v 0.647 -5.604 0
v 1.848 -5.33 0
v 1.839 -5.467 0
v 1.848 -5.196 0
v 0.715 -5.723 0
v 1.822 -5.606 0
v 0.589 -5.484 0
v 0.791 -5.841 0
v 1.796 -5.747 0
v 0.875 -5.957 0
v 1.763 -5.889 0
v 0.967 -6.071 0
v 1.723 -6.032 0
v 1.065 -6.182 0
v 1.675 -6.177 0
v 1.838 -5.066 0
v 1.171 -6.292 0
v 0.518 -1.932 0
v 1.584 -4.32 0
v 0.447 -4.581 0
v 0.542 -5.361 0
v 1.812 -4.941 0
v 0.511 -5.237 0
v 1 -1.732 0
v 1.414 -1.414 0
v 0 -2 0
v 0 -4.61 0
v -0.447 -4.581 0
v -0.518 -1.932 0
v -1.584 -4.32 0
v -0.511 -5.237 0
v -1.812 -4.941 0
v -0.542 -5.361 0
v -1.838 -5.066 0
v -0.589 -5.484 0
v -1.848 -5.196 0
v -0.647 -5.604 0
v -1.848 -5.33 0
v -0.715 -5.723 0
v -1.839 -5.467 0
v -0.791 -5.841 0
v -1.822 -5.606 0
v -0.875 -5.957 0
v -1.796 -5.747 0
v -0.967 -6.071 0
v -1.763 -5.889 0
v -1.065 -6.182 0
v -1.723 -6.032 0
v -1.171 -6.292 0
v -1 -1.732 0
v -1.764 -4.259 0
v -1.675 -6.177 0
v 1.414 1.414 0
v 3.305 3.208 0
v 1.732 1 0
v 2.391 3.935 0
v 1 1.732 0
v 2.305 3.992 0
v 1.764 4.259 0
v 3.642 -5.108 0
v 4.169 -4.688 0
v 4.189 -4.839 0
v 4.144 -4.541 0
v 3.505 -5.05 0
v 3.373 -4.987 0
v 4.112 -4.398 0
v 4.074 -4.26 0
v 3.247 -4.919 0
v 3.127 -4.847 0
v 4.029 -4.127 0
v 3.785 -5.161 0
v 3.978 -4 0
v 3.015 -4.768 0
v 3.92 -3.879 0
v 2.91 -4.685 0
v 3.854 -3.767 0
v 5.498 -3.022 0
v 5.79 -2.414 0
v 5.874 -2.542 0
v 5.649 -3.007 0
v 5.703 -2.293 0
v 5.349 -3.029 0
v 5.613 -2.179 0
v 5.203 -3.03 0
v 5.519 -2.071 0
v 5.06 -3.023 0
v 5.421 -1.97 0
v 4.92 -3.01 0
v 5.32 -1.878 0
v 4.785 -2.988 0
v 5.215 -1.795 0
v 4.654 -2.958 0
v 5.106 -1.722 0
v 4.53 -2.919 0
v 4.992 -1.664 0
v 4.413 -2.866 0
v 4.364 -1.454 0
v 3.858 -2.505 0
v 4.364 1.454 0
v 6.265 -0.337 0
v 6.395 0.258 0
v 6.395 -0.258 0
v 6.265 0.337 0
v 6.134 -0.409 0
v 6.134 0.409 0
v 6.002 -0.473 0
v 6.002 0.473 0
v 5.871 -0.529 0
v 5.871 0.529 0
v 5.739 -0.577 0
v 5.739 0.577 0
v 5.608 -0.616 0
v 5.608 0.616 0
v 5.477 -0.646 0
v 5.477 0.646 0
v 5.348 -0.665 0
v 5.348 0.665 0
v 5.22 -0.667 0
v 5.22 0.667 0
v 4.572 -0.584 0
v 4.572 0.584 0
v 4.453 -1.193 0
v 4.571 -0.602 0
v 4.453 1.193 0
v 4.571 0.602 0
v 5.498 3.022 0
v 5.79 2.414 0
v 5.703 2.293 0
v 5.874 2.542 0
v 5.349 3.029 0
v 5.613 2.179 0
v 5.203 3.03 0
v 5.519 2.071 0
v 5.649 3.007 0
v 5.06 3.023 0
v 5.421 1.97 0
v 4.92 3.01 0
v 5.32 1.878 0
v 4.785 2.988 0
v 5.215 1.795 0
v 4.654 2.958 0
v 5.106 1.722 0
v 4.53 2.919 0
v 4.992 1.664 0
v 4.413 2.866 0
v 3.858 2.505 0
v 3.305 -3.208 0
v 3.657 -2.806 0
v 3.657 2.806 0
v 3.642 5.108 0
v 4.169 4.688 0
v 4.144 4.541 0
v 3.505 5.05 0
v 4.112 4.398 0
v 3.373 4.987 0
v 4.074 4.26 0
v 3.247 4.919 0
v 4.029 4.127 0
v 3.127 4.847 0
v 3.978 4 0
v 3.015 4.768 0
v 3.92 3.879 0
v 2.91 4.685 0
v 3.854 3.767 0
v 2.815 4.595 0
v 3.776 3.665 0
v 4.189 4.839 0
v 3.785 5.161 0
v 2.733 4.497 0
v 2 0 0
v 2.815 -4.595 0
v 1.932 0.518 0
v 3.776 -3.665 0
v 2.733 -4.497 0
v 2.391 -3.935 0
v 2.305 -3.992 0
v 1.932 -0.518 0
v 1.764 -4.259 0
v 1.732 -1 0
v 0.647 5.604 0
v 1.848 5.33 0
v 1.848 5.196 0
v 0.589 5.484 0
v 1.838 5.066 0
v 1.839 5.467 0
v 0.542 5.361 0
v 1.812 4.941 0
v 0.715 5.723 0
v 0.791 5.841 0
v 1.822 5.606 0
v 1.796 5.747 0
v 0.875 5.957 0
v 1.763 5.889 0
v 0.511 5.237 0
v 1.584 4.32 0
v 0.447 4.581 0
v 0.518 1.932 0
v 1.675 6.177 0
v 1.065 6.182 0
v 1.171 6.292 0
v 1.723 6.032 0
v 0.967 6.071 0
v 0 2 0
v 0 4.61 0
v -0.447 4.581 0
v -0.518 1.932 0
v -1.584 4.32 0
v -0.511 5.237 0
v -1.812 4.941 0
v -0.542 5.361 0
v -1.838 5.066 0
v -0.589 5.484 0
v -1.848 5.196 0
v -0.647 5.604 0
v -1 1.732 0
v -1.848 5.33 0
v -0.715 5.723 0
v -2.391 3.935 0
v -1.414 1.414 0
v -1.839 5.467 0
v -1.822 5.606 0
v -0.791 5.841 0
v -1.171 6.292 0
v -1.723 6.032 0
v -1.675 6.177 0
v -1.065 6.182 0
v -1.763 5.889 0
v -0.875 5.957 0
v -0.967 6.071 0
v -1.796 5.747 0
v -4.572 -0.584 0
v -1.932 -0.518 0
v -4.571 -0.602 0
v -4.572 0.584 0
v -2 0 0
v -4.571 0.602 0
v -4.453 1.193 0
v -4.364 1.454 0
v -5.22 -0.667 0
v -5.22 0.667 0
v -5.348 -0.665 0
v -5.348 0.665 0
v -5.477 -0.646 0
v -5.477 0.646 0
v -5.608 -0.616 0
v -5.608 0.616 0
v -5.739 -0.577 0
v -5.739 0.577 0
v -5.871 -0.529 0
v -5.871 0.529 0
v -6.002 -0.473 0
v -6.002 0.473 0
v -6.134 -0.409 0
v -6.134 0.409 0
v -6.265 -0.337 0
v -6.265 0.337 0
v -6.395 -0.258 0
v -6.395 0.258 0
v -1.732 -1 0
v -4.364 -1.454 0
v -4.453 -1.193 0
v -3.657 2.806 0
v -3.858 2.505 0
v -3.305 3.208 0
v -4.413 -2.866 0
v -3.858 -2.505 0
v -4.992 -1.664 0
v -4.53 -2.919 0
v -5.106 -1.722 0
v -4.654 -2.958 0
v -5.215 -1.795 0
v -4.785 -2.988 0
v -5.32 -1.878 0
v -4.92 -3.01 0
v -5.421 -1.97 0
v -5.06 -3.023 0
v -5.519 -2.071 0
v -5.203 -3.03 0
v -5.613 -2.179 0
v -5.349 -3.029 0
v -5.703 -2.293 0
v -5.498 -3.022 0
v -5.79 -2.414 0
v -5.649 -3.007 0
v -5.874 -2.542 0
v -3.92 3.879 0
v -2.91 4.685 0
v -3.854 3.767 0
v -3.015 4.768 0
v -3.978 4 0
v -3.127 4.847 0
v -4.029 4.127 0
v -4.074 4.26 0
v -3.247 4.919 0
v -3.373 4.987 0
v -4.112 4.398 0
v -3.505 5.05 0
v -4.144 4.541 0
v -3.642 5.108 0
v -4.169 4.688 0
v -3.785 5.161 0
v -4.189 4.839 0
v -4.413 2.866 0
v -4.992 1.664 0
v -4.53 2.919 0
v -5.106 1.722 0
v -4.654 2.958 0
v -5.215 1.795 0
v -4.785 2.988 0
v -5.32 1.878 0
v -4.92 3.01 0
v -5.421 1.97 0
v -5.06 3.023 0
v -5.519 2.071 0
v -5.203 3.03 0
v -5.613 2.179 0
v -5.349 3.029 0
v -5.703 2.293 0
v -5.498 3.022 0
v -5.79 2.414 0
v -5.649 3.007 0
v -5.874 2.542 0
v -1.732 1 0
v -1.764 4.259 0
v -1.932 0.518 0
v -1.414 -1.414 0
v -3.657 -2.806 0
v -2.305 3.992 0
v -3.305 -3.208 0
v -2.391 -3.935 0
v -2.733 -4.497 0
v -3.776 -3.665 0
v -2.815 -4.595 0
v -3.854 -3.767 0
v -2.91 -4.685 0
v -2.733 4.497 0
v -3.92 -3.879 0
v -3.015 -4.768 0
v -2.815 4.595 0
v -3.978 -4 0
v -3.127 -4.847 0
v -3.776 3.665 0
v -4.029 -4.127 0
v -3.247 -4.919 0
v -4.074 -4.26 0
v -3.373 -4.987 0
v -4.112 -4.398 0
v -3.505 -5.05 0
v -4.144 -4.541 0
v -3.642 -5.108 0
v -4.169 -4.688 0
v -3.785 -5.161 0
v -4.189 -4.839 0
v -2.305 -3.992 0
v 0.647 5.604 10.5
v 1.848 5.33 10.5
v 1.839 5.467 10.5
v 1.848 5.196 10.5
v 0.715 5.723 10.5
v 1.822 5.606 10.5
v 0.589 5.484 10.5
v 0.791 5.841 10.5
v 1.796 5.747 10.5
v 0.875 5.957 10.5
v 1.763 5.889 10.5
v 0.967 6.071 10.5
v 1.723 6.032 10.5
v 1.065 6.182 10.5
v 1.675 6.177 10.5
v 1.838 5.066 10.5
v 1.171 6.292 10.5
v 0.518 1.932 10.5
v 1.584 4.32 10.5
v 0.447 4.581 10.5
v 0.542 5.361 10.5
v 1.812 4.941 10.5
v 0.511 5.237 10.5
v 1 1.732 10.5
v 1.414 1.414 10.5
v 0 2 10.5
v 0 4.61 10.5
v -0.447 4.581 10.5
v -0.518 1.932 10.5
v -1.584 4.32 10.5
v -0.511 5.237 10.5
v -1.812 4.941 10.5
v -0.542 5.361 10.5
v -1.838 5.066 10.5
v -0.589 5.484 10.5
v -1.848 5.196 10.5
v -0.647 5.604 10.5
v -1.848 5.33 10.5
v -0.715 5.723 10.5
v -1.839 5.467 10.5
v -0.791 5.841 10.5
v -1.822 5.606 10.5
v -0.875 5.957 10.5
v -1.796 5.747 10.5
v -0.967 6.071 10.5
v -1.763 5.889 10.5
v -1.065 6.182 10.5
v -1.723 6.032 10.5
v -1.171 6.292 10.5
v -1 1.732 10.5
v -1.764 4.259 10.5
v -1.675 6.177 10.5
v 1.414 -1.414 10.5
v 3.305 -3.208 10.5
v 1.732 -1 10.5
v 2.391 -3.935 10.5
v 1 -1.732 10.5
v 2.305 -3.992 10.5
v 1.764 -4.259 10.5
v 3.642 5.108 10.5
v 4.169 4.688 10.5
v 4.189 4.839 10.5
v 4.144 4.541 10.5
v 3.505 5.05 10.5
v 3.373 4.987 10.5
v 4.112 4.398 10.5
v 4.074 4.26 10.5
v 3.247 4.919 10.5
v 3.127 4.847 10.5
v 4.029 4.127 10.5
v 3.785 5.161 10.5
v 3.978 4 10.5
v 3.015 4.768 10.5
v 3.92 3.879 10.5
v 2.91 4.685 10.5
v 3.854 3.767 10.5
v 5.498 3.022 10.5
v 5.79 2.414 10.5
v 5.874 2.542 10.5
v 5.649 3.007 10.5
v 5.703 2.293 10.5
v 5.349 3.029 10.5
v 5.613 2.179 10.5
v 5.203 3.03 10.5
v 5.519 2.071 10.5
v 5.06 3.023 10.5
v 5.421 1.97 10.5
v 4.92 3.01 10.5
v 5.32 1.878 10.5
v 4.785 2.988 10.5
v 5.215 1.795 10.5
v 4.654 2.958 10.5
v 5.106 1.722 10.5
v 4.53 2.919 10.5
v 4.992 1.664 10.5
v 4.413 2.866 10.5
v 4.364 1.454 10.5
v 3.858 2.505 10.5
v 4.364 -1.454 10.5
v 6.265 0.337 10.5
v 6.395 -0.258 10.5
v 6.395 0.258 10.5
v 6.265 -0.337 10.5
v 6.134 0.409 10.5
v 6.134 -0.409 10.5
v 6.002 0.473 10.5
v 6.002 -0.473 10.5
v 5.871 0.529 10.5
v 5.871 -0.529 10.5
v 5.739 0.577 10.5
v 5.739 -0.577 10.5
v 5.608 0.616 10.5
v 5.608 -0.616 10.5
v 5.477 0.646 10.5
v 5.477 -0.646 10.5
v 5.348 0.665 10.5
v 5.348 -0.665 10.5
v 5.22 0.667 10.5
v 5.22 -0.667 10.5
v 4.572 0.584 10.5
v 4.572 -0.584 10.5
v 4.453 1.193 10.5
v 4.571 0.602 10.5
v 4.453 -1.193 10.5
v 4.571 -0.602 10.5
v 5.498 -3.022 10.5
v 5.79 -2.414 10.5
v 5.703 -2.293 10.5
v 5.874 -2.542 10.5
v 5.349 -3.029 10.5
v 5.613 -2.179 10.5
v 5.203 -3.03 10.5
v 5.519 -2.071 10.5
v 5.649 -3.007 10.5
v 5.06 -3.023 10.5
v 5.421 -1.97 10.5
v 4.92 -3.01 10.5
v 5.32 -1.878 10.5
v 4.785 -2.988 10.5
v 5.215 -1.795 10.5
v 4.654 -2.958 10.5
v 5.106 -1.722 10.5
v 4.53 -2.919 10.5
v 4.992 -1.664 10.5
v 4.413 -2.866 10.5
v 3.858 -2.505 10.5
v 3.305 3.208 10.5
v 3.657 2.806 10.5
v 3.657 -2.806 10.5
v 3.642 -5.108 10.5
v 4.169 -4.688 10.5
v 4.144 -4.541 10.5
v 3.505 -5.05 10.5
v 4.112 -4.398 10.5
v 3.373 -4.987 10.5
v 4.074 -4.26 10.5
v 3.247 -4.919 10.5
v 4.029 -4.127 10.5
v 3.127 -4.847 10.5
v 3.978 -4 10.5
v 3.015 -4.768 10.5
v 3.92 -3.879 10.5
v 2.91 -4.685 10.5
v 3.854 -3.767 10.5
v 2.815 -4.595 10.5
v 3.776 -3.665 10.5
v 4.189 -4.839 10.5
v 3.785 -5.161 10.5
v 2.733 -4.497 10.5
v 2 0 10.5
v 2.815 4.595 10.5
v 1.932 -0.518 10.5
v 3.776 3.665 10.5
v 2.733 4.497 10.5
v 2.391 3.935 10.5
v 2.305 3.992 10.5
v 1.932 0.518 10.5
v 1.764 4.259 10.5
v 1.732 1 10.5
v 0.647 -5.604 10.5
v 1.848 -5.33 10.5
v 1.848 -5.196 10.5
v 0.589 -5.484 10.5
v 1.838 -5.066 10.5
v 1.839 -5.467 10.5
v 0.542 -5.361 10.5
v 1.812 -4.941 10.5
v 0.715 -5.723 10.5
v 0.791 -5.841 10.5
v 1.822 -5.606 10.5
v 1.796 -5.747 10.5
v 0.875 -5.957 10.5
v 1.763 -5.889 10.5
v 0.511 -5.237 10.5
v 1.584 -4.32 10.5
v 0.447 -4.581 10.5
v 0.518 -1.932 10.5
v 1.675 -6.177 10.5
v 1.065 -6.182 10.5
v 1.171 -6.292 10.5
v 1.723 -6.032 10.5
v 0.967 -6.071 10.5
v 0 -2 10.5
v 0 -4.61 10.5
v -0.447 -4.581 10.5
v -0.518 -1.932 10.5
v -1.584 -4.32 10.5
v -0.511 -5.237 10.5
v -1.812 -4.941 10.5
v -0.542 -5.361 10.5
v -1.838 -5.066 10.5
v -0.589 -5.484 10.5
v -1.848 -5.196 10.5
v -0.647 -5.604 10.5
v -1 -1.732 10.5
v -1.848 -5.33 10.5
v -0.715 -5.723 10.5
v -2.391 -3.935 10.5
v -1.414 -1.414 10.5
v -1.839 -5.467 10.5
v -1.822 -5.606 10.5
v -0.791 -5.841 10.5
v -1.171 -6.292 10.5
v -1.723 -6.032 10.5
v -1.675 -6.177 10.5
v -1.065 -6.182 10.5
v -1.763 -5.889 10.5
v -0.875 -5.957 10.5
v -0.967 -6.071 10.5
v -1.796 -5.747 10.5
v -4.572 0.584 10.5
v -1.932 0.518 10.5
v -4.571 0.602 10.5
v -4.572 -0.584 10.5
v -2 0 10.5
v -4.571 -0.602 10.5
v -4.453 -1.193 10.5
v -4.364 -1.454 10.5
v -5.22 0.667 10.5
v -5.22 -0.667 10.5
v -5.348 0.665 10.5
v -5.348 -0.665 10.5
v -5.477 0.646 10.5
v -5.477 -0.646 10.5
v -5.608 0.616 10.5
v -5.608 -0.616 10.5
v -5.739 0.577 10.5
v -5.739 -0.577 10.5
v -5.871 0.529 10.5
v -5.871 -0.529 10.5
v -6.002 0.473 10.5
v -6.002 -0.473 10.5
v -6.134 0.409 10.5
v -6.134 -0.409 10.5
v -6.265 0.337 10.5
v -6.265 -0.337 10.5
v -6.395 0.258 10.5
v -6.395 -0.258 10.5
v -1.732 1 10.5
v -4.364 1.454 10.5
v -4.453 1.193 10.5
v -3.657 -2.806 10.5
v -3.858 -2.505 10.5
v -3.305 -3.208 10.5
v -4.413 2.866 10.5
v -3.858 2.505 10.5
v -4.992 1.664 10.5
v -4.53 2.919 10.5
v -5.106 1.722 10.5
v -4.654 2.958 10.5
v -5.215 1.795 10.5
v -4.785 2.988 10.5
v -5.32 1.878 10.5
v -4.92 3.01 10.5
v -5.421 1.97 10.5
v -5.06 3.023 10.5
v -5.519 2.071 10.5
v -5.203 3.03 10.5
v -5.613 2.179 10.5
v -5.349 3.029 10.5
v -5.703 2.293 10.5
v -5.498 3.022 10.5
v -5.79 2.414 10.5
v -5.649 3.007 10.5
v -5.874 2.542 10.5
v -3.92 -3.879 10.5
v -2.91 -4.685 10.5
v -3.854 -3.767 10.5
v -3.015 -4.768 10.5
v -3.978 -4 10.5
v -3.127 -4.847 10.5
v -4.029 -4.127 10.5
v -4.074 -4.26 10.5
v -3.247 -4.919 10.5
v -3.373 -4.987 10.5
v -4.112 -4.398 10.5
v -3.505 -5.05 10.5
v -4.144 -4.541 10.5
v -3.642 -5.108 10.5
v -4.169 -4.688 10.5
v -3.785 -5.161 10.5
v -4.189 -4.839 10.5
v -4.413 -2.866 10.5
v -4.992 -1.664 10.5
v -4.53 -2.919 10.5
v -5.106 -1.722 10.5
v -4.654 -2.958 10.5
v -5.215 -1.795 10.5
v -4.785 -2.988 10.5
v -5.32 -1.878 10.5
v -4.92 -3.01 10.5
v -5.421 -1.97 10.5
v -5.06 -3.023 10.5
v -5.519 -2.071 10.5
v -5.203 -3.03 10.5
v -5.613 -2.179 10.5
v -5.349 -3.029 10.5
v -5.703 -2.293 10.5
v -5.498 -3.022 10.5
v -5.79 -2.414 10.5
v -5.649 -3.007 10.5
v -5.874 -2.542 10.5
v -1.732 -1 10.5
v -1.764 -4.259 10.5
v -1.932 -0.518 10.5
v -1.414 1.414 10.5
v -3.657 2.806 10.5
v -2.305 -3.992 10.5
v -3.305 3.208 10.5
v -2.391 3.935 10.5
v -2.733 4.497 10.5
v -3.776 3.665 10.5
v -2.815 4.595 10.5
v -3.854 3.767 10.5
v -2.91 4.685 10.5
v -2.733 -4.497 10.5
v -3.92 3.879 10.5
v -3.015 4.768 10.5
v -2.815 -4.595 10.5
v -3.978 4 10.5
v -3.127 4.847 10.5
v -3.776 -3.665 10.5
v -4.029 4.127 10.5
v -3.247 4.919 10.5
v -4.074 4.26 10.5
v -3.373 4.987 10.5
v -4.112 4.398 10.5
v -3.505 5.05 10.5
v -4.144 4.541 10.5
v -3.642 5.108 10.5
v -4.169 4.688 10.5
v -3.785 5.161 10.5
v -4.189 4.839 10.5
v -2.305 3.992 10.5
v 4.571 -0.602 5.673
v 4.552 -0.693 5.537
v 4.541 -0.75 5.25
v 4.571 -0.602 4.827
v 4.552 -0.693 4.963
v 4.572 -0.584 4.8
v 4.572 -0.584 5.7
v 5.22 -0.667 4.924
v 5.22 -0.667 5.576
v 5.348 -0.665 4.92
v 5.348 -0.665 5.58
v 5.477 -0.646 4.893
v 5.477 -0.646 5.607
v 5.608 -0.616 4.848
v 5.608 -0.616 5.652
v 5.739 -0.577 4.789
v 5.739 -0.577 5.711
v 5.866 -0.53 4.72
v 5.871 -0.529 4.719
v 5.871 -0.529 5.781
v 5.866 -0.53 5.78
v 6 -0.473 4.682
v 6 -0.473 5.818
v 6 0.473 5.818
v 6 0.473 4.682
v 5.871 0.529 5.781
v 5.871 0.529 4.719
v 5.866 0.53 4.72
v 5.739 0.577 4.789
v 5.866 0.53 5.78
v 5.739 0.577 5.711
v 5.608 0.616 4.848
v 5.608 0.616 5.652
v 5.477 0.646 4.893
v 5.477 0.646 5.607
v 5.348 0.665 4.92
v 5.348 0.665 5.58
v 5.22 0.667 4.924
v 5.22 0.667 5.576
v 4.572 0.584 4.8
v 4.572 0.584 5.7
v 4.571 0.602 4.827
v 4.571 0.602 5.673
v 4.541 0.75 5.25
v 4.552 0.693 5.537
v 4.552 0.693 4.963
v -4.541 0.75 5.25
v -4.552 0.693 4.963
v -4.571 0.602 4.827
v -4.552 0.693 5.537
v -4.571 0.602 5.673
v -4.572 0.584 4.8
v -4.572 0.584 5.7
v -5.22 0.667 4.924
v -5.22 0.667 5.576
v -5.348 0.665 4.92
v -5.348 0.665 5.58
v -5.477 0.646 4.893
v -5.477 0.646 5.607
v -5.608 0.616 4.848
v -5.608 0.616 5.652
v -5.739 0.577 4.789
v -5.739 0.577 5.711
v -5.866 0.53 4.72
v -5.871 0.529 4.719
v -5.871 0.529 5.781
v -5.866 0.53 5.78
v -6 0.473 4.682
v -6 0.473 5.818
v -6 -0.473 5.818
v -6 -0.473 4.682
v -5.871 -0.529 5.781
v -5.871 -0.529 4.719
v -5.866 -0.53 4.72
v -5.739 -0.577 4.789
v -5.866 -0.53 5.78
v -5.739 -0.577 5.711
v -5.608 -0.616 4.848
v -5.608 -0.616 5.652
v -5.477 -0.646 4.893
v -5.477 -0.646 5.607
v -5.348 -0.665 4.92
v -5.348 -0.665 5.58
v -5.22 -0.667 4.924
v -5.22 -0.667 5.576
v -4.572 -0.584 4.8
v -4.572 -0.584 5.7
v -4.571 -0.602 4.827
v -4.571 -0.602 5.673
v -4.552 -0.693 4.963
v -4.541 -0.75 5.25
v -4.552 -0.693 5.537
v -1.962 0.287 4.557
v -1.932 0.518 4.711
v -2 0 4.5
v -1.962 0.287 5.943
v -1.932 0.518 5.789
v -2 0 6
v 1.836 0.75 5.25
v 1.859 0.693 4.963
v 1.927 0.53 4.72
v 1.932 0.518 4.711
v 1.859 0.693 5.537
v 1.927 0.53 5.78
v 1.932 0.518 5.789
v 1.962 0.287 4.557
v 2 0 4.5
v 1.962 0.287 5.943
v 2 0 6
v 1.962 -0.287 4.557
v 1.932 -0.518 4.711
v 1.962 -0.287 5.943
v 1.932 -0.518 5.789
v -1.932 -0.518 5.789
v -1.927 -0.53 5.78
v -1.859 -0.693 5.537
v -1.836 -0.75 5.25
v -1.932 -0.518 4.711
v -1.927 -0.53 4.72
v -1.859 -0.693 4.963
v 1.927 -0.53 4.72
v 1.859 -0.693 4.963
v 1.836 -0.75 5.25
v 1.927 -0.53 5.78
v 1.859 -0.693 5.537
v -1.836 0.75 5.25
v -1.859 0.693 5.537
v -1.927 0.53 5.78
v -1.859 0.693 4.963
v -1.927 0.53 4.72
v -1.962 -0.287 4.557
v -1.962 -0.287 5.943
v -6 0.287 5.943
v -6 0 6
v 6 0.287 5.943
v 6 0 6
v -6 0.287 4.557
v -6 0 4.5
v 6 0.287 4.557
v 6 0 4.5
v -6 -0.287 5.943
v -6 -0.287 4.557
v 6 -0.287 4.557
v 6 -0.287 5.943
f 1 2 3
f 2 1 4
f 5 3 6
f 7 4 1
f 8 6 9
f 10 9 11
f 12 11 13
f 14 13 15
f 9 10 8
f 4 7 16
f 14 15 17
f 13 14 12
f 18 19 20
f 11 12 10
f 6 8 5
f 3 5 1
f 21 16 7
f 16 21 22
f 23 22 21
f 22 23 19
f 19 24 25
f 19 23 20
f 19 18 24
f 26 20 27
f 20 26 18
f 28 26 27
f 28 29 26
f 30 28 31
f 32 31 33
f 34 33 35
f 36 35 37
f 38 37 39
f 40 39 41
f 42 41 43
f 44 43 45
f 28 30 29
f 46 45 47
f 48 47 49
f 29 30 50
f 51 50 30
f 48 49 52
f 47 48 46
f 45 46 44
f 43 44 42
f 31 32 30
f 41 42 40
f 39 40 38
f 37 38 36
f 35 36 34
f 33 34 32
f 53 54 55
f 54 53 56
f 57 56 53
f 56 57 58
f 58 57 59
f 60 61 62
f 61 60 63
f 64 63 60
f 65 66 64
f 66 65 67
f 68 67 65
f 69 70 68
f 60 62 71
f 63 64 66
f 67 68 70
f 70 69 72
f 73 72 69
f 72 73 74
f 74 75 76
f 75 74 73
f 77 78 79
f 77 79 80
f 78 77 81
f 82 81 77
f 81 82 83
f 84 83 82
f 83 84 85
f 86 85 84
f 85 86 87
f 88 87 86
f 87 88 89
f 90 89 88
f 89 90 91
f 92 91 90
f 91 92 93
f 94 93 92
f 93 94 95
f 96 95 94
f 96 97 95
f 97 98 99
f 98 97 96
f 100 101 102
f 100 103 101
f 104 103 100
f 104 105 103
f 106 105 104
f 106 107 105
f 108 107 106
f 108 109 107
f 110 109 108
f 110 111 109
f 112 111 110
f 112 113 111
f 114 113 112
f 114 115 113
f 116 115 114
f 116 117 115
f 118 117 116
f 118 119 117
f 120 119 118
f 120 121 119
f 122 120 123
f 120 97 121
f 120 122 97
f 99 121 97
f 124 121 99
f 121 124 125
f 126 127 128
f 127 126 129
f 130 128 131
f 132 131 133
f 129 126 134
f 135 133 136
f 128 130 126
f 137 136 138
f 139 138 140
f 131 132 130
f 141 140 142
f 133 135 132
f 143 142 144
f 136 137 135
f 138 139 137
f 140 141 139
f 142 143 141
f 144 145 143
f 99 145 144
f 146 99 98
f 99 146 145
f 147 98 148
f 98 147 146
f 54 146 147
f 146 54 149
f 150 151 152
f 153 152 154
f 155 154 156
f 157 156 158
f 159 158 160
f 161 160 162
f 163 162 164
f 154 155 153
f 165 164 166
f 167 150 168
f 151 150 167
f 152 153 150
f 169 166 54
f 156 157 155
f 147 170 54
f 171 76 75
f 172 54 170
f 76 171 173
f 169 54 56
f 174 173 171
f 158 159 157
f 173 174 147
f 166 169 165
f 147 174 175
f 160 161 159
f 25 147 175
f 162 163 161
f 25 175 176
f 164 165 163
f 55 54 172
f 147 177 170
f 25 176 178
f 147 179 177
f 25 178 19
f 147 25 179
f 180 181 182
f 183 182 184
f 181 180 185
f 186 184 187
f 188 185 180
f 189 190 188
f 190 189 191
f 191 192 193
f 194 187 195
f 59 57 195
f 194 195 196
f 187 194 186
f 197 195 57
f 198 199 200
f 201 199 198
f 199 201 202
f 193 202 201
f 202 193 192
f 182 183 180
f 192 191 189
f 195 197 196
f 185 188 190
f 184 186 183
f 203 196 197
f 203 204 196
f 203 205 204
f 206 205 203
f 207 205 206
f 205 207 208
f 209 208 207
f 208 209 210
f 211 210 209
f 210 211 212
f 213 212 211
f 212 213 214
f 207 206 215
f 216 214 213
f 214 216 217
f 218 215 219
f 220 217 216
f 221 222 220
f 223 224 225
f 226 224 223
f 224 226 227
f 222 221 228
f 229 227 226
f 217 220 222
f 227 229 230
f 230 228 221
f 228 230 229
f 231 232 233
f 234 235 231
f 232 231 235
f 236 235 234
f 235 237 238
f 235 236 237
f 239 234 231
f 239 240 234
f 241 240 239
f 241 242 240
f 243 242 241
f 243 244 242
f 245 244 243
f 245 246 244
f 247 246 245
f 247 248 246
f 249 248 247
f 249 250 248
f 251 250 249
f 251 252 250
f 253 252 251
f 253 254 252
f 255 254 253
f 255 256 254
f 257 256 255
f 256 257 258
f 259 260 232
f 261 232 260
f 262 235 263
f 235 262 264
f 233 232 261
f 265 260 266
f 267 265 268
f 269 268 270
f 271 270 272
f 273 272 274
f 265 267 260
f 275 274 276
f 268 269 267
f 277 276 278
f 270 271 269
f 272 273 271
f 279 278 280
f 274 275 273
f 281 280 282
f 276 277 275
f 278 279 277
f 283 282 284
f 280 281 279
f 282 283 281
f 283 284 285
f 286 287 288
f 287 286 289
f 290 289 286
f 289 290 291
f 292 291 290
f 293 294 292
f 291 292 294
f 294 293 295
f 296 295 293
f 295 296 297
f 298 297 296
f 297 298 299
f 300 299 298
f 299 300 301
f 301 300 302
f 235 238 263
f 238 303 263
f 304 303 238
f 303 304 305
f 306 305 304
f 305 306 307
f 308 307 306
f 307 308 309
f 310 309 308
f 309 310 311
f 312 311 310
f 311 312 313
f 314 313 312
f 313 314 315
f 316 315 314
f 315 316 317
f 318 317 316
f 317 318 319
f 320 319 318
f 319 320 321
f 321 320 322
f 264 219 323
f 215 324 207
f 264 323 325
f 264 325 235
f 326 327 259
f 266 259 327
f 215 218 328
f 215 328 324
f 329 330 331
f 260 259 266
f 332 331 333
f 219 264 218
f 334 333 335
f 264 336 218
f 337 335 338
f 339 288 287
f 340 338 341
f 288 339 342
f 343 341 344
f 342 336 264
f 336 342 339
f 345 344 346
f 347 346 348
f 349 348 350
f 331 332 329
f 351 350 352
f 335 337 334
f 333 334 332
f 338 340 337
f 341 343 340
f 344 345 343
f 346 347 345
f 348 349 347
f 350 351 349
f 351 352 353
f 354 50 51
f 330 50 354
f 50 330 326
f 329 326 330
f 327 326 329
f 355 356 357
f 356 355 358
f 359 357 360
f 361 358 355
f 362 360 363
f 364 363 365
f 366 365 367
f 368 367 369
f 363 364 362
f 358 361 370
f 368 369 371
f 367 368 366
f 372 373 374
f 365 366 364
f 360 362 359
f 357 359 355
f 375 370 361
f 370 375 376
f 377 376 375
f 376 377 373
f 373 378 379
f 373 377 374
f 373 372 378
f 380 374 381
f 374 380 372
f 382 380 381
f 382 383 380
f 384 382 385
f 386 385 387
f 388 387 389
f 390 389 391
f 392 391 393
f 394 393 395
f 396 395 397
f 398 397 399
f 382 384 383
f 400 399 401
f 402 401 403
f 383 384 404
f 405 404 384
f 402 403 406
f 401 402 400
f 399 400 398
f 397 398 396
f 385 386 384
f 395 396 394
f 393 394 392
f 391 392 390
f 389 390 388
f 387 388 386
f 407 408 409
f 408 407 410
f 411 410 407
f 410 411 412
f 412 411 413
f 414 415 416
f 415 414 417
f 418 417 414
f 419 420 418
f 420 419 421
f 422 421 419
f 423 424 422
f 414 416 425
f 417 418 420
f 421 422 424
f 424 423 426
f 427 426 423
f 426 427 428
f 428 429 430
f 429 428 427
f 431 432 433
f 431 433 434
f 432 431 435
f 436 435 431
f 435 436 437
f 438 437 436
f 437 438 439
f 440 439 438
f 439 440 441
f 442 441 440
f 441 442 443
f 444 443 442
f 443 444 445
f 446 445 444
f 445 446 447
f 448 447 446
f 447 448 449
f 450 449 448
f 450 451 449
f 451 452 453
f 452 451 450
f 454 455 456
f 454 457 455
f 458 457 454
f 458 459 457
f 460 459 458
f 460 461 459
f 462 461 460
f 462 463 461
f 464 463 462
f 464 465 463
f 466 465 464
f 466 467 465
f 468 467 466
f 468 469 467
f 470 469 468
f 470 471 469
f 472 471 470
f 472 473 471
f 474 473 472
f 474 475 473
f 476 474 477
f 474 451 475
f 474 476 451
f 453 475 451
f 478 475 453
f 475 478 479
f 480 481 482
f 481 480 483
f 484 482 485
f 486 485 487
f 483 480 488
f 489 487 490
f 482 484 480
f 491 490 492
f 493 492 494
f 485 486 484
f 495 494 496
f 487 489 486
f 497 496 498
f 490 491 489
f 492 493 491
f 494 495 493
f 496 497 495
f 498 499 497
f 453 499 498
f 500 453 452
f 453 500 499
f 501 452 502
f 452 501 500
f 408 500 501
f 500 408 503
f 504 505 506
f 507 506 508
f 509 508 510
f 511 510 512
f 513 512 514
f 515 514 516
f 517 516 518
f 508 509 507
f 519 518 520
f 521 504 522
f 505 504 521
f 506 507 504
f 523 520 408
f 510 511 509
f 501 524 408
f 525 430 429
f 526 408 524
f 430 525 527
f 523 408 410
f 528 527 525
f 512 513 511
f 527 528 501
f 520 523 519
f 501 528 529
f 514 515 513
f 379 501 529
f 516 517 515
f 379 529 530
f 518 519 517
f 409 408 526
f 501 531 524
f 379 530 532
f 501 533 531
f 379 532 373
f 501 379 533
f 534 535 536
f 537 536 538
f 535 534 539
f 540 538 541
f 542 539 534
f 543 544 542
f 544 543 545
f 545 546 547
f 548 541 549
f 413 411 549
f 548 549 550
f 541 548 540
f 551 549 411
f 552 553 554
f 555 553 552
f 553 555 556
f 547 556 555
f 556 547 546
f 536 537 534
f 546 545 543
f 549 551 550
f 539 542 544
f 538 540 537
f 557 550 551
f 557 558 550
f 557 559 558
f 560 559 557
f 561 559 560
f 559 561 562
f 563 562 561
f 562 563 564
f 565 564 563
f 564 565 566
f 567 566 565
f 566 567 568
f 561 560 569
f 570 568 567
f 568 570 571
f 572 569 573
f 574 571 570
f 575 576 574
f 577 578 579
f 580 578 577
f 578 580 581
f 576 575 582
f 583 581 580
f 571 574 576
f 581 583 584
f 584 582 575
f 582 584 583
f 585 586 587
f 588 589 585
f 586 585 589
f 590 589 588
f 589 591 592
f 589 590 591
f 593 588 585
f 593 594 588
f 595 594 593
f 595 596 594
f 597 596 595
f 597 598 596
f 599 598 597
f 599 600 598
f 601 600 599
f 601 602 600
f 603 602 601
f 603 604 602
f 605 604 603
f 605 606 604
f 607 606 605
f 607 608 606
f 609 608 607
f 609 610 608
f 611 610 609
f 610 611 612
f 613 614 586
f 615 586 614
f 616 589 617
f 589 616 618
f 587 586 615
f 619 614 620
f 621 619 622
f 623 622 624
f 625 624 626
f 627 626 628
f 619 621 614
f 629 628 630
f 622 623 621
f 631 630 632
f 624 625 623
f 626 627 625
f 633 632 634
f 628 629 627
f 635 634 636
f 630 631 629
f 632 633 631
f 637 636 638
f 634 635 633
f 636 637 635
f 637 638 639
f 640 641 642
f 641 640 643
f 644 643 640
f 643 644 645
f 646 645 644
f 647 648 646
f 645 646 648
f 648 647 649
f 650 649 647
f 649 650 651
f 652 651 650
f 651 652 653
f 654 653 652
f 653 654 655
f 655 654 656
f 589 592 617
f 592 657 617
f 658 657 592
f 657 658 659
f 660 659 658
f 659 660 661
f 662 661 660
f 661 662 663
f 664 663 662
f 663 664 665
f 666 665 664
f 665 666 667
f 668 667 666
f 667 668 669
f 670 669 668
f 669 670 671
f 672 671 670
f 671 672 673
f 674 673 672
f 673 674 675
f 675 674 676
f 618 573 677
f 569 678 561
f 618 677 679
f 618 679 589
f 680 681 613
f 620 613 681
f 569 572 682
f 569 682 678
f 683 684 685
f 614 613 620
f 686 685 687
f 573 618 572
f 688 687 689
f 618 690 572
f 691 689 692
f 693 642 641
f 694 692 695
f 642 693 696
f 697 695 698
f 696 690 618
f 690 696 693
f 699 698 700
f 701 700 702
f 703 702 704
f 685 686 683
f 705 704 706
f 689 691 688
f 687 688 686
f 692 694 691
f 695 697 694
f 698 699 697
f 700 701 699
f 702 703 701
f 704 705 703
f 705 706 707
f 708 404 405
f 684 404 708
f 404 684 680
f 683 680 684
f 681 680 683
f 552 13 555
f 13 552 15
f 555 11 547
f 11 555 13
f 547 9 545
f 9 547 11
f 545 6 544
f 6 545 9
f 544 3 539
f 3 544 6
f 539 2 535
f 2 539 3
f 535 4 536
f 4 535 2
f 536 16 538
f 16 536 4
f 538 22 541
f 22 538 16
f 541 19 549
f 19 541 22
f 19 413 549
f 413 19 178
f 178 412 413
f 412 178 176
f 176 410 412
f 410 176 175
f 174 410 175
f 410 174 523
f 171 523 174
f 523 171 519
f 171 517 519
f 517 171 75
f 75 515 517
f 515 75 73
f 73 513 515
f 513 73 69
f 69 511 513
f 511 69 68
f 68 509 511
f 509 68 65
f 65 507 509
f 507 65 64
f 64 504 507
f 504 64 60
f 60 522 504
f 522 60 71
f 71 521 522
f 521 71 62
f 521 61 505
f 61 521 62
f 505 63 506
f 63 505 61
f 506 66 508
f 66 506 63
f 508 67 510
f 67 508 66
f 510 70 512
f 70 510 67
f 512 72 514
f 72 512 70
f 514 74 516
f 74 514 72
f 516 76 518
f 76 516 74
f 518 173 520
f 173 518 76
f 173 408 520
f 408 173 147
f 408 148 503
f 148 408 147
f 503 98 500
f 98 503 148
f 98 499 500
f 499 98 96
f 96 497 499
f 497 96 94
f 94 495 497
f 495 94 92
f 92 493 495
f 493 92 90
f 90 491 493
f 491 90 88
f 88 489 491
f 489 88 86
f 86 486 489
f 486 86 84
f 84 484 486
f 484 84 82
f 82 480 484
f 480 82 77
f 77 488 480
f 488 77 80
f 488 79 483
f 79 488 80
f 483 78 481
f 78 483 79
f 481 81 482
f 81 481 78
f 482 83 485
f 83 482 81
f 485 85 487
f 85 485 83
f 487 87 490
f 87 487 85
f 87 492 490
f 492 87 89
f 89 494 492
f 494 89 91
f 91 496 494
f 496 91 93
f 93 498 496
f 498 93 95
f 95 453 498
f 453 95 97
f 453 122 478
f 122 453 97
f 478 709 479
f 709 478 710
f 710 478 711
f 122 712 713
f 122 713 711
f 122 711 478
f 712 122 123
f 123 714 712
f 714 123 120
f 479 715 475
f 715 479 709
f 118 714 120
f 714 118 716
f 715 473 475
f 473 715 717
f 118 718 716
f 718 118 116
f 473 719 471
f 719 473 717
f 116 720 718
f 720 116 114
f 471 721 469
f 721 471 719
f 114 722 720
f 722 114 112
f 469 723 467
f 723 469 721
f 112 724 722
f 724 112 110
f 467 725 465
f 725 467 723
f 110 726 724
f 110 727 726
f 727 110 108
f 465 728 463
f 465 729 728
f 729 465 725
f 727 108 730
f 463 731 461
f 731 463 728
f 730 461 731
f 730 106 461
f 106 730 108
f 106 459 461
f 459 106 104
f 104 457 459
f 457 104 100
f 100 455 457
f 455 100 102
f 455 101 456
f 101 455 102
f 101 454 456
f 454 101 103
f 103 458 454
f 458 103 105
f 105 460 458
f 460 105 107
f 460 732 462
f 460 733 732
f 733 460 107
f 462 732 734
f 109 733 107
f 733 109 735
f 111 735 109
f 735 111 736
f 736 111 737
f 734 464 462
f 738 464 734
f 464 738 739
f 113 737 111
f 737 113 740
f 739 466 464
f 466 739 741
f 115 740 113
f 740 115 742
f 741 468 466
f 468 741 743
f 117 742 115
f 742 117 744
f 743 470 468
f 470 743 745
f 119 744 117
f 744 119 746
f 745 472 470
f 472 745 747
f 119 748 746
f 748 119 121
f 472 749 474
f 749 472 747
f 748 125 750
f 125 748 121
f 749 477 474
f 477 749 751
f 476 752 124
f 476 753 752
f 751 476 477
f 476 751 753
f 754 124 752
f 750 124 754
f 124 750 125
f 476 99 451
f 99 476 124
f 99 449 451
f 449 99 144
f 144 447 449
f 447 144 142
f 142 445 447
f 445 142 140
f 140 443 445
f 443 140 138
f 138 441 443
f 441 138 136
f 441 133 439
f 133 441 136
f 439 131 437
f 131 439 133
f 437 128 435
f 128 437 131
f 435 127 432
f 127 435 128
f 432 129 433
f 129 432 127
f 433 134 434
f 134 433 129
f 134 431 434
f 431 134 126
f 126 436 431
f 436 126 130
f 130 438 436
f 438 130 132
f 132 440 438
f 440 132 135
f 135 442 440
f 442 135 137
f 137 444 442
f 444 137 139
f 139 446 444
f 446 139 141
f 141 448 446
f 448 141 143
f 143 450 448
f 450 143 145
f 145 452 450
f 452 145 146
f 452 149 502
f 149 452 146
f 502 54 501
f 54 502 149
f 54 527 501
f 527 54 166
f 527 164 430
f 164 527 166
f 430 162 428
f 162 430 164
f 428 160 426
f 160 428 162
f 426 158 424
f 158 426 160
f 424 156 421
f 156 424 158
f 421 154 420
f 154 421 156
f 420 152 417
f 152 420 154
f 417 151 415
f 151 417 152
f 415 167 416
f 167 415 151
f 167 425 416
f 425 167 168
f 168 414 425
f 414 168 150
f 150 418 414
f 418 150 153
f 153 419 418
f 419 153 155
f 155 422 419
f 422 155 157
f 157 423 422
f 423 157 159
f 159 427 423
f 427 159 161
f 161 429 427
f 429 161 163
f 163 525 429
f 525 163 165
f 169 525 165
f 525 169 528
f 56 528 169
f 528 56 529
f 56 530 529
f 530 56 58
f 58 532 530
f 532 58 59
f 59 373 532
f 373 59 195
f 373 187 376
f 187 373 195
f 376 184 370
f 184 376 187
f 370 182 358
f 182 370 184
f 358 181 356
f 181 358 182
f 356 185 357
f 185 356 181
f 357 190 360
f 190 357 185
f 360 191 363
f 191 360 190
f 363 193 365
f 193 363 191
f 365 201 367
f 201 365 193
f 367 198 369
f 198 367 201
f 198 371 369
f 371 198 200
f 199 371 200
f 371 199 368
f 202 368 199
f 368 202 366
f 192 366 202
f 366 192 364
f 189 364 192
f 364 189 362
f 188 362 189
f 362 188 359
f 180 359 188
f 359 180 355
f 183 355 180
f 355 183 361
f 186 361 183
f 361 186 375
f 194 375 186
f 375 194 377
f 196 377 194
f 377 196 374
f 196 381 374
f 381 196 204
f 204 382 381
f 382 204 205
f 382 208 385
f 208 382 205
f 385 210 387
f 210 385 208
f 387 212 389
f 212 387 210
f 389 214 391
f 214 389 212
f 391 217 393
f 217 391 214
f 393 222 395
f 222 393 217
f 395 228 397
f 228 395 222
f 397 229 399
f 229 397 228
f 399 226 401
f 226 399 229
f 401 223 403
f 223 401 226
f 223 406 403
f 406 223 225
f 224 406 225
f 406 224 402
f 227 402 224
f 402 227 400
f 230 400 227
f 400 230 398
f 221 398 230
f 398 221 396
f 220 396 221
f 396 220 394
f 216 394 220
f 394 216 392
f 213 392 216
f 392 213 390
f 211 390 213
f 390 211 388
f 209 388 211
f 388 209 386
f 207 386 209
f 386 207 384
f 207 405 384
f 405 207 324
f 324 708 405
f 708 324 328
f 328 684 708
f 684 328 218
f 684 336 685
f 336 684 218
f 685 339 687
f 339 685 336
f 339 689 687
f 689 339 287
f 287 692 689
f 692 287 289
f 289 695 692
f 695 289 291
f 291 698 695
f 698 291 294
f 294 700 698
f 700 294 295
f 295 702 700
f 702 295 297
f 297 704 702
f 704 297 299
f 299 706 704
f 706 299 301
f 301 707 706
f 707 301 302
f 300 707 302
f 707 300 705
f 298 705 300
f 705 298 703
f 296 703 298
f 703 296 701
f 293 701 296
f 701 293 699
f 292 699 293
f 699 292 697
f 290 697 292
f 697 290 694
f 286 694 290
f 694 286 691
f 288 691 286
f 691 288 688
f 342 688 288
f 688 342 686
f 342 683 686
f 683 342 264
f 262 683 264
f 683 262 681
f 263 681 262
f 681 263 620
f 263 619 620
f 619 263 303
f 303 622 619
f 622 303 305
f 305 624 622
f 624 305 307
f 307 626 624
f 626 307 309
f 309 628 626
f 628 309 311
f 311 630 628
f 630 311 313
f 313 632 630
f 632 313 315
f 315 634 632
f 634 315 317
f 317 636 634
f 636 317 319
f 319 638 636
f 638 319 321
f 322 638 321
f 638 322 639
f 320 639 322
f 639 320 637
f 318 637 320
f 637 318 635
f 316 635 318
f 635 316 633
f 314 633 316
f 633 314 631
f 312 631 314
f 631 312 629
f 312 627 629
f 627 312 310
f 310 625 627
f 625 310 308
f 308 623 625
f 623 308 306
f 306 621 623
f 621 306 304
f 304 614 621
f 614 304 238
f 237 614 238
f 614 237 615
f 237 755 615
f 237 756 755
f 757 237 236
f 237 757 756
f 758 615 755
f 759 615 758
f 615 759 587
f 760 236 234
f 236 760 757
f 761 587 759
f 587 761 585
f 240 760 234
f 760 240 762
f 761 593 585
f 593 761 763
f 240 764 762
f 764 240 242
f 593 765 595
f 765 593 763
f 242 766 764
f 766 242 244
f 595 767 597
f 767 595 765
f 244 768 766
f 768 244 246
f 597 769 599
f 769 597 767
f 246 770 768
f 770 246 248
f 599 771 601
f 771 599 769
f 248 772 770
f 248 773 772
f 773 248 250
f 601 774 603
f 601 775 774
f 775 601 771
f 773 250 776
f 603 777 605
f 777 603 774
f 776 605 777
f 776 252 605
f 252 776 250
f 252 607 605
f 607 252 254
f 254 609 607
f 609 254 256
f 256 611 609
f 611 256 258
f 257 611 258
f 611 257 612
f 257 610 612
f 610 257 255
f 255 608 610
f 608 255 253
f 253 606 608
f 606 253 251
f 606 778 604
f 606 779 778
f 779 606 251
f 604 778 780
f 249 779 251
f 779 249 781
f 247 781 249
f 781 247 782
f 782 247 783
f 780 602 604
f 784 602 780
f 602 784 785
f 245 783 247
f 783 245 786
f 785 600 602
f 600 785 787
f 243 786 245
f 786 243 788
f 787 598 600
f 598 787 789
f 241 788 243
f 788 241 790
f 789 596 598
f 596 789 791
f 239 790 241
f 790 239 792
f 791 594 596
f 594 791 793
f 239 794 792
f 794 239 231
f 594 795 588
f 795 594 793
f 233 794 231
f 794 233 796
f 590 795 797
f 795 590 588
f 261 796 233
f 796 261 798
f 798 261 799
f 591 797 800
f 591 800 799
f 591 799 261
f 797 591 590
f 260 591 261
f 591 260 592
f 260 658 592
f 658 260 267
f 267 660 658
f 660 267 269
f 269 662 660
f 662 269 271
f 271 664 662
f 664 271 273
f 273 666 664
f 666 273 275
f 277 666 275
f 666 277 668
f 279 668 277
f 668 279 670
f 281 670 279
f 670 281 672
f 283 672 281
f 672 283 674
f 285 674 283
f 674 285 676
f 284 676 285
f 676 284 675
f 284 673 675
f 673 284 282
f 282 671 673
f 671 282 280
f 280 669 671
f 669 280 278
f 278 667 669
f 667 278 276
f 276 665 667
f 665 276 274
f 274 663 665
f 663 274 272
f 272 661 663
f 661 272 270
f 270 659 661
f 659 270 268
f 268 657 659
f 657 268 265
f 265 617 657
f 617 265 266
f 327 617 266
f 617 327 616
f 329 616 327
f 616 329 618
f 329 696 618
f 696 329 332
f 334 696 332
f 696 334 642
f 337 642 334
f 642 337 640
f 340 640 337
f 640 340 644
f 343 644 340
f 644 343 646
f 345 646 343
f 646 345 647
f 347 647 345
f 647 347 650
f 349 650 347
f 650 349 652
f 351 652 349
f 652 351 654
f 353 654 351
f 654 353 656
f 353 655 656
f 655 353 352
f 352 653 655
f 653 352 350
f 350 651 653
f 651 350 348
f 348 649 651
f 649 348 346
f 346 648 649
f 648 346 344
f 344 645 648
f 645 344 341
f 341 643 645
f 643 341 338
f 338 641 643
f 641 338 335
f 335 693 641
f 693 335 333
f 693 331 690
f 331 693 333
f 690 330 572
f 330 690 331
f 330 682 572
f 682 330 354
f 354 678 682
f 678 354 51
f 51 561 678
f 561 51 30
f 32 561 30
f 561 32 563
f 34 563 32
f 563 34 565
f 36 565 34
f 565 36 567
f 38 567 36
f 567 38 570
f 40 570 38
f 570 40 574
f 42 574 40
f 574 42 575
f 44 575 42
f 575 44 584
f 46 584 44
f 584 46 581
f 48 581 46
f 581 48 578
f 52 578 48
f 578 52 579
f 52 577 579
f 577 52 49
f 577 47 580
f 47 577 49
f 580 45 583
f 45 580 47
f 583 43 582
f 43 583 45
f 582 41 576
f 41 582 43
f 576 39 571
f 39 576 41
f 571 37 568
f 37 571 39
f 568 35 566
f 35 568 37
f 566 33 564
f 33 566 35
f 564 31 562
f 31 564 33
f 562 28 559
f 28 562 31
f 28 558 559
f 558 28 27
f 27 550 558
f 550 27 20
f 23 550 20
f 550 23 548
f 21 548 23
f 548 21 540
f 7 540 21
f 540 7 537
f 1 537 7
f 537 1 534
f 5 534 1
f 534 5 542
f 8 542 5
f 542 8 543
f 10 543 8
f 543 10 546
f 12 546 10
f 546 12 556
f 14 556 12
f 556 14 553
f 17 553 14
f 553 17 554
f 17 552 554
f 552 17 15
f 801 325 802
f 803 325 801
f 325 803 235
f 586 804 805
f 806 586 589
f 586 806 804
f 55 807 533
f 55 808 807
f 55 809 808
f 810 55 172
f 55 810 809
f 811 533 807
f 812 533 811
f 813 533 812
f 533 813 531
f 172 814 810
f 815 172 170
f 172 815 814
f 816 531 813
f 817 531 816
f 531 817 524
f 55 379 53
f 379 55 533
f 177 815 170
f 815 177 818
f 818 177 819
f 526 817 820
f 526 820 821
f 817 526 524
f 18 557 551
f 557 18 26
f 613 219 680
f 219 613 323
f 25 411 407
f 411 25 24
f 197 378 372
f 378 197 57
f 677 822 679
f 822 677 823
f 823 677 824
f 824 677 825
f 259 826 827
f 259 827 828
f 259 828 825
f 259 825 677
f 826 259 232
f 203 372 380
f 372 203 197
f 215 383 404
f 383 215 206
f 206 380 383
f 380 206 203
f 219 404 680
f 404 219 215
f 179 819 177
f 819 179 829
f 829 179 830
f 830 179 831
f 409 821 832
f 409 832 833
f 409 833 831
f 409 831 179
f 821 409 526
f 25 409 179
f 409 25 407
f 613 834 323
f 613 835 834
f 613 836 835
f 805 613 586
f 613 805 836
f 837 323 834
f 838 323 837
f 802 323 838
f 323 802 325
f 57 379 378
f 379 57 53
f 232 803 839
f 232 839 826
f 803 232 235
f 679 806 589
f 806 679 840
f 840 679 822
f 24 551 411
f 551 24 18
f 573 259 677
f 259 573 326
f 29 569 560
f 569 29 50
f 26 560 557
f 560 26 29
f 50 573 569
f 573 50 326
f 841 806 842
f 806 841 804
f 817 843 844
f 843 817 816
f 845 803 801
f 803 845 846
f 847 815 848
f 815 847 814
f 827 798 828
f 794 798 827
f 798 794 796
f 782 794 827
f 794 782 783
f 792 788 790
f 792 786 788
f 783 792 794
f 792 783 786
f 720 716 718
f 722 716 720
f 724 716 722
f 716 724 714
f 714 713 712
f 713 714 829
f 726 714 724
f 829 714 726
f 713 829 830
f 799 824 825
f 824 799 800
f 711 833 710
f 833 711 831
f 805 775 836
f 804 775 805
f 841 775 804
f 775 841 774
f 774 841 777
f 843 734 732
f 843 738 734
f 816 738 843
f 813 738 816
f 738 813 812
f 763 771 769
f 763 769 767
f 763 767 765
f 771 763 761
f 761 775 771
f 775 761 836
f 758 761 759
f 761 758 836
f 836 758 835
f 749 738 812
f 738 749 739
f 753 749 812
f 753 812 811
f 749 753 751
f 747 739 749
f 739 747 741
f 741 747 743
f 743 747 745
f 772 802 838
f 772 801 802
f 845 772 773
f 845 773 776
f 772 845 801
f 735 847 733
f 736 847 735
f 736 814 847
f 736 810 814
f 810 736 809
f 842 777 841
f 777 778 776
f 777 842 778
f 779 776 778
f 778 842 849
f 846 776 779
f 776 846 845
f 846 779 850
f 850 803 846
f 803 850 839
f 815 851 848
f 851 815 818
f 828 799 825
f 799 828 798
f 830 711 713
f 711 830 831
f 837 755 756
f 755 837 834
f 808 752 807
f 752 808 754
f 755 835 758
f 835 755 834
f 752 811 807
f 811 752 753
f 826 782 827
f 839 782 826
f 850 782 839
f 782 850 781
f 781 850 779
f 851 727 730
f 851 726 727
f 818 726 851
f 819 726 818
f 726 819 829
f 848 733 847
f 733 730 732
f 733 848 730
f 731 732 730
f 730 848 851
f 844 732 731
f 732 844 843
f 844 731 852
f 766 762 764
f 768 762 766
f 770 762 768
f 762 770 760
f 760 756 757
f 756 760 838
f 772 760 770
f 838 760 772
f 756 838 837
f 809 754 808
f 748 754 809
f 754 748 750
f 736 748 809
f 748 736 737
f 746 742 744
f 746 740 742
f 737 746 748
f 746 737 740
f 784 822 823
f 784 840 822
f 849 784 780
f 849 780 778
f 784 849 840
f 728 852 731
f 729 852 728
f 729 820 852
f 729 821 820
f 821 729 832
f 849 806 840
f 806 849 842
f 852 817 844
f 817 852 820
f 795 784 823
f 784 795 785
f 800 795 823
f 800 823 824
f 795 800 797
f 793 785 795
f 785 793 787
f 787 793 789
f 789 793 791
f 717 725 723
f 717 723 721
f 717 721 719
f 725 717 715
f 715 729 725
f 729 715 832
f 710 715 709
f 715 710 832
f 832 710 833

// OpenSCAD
// =============================================================================
// wing_tilt_pinion.scad — nacelle tilt drive, wing-side 14T pinion (64 mm, A)
// =============================================================================
// The pinion on the outboard end of the Ø4 tilt drive shaft (wings_s1223_revo
// .scad tilt_shaft_bore(), station 53.6).  It drives the trunnion's 50T ring
// (nacelle_trunnion_64mm.scad) — module 0.8, 20° PA, i = 3.571, C = 25.6 mm.
// Until 2026-10-03 the pinion existed only as a number; it is now a part.
//
// FACE 10.5 mm — owner option A (WBS NAC-64-TILT-01/-03): matches the widened
// ring face so the full ring face is in contact.
//
// MATERIAL: METAL (steel or brass), NOT PRINTED.  Same tangential load as the
// ring (43.9 N limit, bounding aero), but the Lewis form factor of a 14T gear
// is 0.277 against 0.409 for 50T (Shigley 10th ed. Table 14-2 [REF-STD-GEAR-002],
// table number requires verification).  Root stress 18.9 MPa, so CF-PETG
// (54 MPa [REF-MAT-002]) gives FOS 2.86 < 4.  The material's bending allowable
// must be >= 76 MPa (tools/nacelle_tilt_dynamics.py prints the live figure).
// Wider face cannot fix a printed pinion: contact is limited by the ring face.
//
// RETENTION: one ISO 8752 Ø1.5 x 8 slotted spring pin, cross-drilled through
// pinion and shaft at mid-face.  It carries both torque and axial location;
// pin length 8 < root Ø 9.2, so it stays inside the tooth roots.  Torque at the
// pinion 0.246 N·m limit -> pin double-shear 17 MPa (spring steel, ample).
// No hub: the inboard face sits at the trunnion collar plane (COLLAR_X0 47.84)
// and the outboard face 10.5 mm further into the pod relief; a hub on either
// side would enter the collar slot (Ø5.6) or the spar-tip gap.
//
// PLACEMENT (nacelle-local, PYLON_SIDE = +1): faces at X 37.34 .. 47.84;
// shaft therefore protrudes >= 16.5 mm past the wing tip pad (X 53.84) plus
// 1 mm chamfer run-out = 17.5 mm minimum stick-out.
//
// Mass: 0.852 cm³ (rendered) -> 6.7 g steel / 7.2 g brass (densities 7.85 / 8.5 g/cm³
// ASSUMED nominal); +7 g on the wing tip vs the unmodelled baseline.
//
// IN-CONTEXT CHECK (2026-10-03): this mesh rolled against the 64 mm trunnion
// ring over tilt -5..135 deg (spin = PH + orbit x (1 + 50/14)): tooth overlap
// 0.03-0.06 mm³ throughout (zero-backlash tangency), pod 0 mm³.
//
// Standards: ISO 8752 (spring-type straight pins, slotted, heavy duty) — see
// REFERENCES.md REF-STD-PIN-001.  Involute construction identical to
// nacelle_tip_gear_variants.scad / nacelle_trunnion.scad.
//
// Author: Steve Griffing, PE(CSE), CISSP-ISSEP, CEH (Stab-Rabbit-coding) —
// direction.  Part by Claude (Claude Opus 5.5, Anthropic), per AGENTS.md AI
// attribution.  License: CERN-OHL-W-2.0 — see LICENSES/CERN-OHL-W 2.0 (SPDX-License-Identifier: CERN-OHL-W-2.0)
// =============================================================================

TP_M      = 0.8;     // [mm] module
TP_Z      = 14;      // teeth (no-undercut floor at 20° PA)
TP_PA     = 20;      // [deg] pressure angle
TP_FACE   = 10.5;    // [mm] face width (option A)
TP_BORE   = 4.0;     // [mm] Ø4 shaft, H7 bore (ream on the machined part)
TP_PIN_D  = 1.5;     // [mm] ISO 8752 spring pin nominal Ø
TP_PIN_L  = 8.0;     // [mm] pin length
TP_FN     = 48;

function tp_inv(a) = tan(a) - a * PI / 180;
function tp_rb()   = TP_M * TP_Z / 2 * cos(TP_PA);
function tp_ra()   = TP_M * TP_Z / 2 + TP_M;
function tp_rf()   = TP_M * TP_Z / 2 - 1.25 * TP_M;
function tp_r0()   = max(tp_rf(), tp_rb());
function tp_flank(r) = 90 / TP_Z + (tp_inv(TP_PA) - tp_inv(acos(tp_rb() / r))) * 180 / PI;
function tp_r(i)   = tp_r0() + (tp_ra() - tp_r0()) * i / 9;

// 2-D involute profile.  At 14T the root circle (rf 4.60) lies INSIDE the
// base circle (rb 5.26), so the core is the ROOT circle and each flank runs
// radially from rf to rb before the involute starts.  (A core filled out to
// rb — as the variant stand-in does — leaves no room for the ring's tips,
// which reach r 4.80 from the pinion centre: found by the in-context sweep.)
module tilt_pinion_2d() {
    a0 = tp_flank(tp_r0());
    union() {
        circle(r = tp_rf() + 0.01, $fn = TP_FN);
        for (k = [0 : TP_Z - 1]) rotate(k * 360 / TP_Z)
            polygon(concat(
                [[tp_rf() * cos(-a0), tp_rf() * sin(-a0)]],
                [for (i = [0 : 9]) let(r = tp_r(i), a = -tp_flank(r)) [r * cos(a), r * sin(a)]],
                [for (i = [9 : -1 : 0]) let(r = tp_r(i), a = tp_flank(r)) [r * cos(a), r * sin(a)]],
                [[tp_rf() * cos(a0), tp_rf() * sin(a0)]]));
    }
}

// The part: z = 0 is the OUTBOARD face (nacelle side), z = TP_FACE inboard.
module tilt_pinion() {
    difference() {
        linear_extrude(TP_FACE) tilt_pinion_2d();
        translate([0, 0, -1]) cylinder(d = TP_BORE, h = TP_FACE + 2, $fn = 24);
        // spring-pin cross hole at mid-face
        translate([0, 0, TP_FACE / 2]) rotate([0, 90, 0])
            cylinder(d = TP_PIN_D, h = TP_PIN_L + 4, center = true, $fn = 16);
    }
}

assert(TP_PIN_L < 2 * tp_rf(), "spring pin must stay inside the root circle");

if (is_undef(TP_NO_RENDER)) tilt_pinion();
